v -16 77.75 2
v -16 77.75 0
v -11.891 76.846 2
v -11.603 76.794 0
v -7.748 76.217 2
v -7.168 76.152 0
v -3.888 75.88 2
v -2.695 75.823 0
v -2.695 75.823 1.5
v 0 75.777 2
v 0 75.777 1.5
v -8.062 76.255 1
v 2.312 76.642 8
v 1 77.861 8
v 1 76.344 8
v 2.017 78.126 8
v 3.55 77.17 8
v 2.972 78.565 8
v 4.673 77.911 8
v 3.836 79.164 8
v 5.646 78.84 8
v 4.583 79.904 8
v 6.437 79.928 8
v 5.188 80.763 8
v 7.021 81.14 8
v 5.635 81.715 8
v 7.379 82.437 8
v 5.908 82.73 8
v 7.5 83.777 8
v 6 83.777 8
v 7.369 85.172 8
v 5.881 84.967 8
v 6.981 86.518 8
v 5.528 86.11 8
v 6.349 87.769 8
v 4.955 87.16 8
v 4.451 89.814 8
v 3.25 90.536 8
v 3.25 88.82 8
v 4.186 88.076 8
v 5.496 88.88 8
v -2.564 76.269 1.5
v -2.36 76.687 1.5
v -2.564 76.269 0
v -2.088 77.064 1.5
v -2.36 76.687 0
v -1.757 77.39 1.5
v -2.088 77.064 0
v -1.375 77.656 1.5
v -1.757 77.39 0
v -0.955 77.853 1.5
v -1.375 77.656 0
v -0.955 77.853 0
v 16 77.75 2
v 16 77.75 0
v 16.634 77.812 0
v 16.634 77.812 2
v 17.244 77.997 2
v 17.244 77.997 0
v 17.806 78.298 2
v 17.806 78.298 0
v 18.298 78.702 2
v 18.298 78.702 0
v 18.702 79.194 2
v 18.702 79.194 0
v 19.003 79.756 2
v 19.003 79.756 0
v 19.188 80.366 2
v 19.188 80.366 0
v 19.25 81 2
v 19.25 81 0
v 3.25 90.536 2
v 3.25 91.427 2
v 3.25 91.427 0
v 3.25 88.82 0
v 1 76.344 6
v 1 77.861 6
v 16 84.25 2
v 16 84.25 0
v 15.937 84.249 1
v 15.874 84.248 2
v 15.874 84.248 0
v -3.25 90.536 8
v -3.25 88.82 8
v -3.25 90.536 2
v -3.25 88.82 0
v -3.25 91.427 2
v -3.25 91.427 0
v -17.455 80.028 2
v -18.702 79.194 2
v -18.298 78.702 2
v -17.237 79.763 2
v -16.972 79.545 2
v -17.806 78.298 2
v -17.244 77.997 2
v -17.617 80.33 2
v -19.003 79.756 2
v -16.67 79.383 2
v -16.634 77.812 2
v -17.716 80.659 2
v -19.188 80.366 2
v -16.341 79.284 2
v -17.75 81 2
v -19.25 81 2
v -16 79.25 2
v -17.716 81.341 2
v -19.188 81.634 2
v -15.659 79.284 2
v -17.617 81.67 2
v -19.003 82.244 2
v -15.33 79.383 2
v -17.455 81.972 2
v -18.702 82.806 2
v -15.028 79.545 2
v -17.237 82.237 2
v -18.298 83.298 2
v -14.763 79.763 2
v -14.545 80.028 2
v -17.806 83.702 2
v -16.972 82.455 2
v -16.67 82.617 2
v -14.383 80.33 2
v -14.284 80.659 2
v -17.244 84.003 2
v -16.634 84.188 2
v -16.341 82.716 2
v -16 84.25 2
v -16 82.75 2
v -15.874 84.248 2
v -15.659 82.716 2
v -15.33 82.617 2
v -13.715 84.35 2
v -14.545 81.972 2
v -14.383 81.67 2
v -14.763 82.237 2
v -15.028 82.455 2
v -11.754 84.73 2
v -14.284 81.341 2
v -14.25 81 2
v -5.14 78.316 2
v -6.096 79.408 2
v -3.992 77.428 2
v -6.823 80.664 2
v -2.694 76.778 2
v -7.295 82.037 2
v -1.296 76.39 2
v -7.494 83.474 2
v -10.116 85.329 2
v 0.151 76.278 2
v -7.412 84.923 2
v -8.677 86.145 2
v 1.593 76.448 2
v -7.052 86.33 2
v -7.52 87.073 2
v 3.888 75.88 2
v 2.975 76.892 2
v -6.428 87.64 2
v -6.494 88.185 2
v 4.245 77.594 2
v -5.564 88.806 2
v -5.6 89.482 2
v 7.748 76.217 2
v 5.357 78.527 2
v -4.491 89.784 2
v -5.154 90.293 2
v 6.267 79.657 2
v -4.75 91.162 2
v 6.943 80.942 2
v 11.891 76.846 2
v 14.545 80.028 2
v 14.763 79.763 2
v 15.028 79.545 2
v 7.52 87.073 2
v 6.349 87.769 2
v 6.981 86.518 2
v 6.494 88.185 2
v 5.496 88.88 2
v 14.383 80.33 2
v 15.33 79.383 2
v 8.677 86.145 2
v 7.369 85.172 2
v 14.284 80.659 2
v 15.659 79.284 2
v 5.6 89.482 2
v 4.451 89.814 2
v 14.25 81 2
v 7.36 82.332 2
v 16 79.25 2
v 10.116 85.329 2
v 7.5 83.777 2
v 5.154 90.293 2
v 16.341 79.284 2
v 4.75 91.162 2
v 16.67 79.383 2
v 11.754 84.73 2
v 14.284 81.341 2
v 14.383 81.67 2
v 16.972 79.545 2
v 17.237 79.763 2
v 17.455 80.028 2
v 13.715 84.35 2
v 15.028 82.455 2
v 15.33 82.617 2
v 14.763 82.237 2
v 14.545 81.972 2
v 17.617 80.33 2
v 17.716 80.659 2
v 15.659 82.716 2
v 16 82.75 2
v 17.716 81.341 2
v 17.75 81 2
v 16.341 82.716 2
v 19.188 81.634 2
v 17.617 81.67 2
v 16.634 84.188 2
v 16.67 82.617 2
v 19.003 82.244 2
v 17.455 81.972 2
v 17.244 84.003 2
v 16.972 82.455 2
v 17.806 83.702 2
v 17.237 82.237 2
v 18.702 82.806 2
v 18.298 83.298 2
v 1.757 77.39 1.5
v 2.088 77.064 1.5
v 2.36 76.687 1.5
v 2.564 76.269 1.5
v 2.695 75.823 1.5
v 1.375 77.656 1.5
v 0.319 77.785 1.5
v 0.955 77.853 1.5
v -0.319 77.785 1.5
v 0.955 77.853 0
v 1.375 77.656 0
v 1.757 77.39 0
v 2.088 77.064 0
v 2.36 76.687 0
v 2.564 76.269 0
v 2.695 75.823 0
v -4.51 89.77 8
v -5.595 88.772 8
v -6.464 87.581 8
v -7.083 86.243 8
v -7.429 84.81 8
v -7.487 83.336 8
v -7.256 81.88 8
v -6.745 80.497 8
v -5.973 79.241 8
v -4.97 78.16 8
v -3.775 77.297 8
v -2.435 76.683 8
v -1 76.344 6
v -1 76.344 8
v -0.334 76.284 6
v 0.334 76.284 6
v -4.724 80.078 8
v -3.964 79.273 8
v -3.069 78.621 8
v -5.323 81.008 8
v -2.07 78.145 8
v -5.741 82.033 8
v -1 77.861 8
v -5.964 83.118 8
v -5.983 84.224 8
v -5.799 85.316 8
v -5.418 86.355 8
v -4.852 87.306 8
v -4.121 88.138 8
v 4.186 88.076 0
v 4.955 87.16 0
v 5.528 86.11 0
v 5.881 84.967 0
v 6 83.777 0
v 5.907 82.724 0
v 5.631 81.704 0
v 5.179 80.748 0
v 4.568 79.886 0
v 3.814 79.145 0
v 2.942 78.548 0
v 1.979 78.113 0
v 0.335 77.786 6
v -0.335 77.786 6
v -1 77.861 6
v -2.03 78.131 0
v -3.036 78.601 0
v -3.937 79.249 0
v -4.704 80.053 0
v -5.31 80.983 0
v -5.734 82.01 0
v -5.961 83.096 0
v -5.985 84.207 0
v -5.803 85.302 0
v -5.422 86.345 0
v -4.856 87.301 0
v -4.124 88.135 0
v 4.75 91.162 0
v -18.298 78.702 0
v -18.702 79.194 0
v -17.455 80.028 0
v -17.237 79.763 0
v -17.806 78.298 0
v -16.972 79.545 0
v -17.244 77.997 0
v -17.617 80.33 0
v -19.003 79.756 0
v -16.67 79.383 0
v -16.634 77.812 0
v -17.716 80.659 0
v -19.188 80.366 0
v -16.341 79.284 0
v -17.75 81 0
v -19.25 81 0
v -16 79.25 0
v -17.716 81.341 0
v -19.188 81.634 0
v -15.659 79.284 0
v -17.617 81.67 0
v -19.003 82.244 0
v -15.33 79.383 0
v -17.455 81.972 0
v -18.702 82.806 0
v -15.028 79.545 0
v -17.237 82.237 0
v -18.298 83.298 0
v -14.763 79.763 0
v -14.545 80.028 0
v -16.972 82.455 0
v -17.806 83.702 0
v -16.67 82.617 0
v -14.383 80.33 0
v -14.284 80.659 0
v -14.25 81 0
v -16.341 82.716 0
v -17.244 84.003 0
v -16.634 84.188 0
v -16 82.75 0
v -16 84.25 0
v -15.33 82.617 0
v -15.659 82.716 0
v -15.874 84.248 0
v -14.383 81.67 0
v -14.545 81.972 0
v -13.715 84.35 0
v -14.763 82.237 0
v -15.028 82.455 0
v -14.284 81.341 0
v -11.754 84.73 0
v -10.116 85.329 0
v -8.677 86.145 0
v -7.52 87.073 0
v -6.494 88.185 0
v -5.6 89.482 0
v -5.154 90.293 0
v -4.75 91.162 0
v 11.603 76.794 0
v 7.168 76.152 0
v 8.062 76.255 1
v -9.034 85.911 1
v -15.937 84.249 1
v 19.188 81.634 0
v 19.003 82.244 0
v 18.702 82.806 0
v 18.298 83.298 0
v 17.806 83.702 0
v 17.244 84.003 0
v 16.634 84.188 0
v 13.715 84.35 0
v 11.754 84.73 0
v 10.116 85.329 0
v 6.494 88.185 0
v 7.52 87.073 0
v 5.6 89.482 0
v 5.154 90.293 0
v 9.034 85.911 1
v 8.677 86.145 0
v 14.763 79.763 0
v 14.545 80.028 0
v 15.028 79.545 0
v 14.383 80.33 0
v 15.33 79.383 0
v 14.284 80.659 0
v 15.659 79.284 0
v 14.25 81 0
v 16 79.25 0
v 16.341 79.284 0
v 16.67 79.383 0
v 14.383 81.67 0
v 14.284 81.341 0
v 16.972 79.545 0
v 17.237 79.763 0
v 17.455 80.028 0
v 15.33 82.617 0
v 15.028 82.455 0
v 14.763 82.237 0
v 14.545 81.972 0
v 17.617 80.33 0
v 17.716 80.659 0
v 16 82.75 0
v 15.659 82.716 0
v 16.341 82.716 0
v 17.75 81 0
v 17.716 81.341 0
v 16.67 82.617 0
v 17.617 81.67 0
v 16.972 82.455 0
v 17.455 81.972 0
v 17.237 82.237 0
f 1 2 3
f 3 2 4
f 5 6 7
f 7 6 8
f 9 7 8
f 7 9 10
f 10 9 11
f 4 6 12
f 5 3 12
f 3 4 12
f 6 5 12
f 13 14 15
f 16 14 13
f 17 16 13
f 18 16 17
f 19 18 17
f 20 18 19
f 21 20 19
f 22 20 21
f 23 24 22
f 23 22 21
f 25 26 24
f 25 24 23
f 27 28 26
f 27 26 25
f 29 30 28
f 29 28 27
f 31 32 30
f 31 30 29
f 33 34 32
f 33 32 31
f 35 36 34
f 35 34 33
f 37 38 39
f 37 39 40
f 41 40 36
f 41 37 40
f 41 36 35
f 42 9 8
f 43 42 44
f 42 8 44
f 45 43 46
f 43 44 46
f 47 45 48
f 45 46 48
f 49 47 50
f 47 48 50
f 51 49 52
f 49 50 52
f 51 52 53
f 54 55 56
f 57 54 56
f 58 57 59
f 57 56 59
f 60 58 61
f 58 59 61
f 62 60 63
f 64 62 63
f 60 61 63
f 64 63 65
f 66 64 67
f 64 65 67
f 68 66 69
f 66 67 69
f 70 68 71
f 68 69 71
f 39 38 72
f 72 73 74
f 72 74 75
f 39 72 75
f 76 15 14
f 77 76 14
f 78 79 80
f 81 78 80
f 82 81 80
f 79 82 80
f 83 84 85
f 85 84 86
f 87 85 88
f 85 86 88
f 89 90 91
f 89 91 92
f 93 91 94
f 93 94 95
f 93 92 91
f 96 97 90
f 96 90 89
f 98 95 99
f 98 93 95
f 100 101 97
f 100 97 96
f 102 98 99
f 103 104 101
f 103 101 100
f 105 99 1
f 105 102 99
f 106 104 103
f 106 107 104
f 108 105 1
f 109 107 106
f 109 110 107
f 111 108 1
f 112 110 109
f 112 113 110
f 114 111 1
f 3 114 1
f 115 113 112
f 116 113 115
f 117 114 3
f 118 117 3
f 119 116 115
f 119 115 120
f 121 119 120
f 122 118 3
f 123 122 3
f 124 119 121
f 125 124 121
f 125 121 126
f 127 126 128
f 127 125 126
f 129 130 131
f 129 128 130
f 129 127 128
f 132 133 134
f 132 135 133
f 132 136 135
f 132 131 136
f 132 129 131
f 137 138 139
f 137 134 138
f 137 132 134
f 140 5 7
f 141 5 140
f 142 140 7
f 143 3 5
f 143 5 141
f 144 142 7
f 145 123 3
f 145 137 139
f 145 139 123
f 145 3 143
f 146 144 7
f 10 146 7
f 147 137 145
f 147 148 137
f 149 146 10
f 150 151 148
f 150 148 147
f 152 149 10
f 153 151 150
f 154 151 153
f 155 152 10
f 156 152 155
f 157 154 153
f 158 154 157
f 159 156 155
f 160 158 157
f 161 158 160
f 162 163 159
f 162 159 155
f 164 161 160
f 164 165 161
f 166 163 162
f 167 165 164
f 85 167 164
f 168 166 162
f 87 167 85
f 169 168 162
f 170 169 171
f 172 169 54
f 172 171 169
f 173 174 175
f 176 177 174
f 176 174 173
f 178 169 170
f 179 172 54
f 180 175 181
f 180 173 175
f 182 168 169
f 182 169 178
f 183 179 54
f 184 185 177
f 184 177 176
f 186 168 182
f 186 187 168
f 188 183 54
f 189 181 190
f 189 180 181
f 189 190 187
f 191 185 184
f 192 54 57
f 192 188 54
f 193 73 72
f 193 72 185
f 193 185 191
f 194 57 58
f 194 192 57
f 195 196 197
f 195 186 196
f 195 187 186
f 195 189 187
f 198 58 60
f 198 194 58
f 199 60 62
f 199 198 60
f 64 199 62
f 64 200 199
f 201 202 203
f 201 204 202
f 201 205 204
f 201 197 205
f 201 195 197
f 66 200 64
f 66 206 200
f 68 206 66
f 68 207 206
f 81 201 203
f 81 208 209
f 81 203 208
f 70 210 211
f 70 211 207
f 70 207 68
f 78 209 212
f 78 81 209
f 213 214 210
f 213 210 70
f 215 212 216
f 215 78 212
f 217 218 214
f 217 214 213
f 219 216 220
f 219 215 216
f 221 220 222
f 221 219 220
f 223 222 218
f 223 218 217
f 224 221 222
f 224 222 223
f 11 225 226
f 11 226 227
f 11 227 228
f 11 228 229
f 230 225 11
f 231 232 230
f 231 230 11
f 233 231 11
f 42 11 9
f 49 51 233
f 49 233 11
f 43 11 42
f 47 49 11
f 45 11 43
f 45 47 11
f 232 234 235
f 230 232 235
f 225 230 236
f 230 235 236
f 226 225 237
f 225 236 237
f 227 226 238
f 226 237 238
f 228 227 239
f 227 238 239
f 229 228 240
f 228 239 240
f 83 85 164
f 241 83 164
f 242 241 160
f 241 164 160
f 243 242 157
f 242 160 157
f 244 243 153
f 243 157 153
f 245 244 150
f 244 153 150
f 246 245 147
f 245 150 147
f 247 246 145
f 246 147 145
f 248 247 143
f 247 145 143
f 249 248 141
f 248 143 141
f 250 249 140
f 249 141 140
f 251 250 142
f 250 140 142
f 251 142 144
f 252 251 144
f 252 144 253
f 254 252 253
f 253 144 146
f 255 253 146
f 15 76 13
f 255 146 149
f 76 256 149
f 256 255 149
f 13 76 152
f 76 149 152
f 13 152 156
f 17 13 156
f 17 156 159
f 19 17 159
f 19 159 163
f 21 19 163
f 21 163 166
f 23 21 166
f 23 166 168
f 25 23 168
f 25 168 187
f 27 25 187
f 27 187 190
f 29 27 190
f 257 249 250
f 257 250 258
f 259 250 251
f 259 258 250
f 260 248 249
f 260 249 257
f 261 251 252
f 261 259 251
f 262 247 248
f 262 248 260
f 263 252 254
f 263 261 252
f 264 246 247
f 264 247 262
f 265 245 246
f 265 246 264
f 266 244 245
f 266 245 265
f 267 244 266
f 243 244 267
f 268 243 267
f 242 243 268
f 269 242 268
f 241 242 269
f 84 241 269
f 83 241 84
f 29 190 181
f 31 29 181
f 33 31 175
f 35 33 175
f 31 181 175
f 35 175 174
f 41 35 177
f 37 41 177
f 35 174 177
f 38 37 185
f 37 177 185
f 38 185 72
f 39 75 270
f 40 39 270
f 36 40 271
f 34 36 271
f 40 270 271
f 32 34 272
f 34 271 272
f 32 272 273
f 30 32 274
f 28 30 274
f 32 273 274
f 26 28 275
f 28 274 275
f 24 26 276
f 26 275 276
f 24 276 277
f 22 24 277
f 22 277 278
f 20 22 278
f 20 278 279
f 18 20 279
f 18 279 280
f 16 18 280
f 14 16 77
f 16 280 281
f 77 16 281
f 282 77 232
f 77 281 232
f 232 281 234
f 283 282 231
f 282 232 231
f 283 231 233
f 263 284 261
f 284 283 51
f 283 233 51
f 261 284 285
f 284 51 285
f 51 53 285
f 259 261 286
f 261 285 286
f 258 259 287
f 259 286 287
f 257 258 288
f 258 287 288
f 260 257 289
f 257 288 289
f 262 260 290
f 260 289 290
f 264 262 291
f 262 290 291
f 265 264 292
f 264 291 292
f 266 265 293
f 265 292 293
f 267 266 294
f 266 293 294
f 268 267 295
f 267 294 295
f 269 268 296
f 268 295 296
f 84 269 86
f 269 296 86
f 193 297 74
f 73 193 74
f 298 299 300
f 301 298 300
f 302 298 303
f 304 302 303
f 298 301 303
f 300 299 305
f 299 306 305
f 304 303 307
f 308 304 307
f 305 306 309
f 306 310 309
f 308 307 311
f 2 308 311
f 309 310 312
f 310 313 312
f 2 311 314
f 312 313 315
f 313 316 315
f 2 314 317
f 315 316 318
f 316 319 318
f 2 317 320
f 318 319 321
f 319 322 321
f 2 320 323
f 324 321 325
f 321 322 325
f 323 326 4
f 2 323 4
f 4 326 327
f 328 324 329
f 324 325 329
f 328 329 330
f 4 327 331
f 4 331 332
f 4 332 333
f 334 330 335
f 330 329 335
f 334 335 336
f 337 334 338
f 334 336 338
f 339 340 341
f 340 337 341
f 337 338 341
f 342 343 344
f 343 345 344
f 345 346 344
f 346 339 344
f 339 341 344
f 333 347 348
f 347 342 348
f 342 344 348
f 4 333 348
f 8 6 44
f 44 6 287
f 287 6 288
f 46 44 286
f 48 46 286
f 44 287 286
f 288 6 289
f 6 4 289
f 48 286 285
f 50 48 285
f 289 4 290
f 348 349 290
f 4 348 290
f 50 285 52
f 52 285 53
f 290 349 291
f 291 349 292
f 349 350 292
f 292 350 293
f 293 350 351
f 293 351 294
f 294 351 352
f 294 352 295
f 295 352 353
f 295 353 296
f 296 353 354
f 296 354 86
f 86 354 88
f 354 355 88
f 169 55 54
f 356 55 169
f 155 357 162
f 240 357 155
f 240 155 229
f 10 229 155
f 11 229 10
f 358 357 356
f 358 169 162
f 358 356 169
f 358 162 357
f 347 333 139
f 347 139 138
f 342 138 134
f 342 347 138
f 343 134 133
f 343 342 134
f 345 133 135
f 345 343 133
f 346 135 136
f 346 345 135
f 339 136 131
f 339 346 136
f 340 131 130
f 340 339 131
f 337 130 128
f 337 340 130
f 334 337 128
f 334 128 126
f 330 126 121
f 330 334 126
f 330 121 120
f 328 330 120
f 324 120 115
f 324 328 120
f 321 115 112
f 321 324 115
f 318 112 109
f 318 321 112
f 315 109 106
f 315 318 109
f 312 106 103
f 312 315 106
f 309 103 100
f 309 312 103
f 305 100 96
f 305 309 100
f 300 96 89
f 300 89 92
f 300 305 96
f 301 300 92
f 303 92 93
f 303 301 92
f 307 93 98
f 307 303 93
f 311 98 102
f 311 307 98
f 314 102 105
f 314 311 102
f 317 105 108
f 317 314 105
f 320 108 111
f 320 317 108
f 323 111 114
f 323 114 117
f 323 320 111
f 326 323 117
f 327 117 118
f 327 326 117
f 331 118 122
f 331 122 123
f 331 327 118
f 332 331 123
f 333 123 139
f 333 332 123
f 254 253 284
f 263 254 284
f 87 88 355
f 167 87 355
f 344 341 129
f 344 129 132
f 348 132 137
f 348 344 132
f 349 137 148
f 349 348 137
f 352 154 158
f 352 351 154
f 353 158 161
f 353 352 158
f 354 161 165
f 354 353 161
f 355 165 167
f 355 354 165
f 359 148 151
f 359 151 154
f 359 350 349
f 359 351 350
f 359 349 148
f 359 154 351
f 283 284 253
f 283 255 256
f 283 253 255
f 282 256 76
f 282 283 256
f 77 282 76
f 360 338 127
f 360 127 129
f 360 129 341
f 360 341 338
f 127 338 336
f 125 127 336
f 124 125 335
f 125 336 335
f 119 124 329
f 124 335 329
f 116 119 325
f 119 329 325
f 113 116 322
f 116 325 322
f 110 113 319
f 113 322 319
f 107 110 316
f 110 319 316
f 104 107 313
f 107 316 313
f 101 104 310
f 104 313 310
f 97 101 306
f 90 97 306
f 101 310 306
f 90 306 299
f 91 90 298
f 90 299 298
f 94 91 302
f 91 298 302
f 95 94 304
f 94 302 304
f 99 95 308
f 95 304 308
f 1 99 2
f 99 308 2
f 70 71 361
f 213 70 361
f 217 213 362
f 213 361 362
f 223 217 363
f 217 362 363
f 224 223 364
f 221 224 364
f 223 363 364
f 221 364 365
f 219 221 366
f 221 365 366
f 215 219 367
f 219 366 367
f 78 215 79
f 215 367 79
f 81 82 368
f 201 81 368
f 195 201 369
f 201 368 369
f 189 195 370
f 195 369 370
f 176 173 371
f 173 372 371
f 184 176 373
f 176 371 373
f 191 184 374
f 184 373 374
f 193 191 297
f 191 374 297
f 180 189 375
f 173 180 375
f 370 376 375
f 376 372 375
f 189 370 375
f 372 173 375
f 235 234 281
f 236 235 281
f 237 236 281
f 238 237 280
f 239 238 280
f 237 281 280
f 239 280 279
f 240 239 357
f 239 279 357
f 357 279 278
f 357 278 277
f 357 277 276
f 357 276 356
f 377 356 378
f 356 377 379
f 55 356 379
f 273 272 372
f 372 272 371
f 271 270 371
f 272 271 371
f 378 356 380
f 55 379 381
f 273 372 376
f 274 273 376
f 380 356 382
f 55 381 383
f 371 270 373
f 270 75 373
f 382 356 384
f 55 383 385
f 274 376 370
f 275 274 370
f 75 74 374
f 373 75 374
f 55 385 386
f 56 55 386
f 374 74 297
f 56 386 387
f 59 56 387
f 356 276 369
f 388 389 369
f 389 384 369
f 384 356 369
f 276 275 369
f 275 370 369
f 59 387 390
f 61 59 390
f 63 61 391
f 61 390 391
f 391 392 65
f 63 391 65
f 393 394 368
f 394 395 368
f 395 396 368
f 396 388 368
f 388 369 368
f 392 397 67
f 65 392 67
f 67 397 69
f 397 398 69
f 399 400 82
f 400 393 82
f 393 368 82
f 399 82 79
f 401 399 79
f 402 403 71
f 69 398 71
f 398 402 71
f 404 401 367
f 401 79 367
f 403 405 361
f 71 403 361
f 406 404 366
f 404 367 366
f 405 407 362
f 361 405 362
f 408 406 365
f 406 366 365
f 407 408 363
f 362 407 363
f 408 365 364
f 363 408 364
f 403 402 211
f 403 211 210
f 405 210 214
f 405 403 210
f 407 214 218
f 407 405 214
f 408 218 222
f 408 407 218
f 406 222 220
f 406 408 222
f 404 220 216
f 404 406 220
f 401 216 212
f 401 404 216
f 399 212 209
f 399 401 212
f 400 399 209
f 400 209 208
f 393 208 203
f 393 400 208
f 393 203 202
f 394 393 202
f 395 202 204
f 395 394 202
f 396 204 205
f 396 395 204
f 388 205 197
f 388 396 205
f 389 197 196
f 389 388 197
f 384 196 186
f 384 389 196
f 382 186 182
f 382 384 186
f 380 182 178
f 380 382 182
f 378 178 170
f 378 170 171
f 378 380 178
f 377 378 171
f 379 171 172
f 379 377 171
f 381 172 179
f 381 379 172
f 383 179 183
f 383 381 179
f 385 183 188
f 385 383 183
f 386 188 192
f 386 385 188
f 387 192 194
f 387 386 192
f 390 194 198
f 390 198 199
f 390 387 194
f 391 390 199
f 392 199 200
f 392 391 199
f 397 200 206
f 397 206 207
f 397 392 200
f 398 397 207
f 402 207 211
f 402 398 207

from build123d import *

# Parameters (mm, degrees)
SKETCH1_R           = 1.75
BOSS_EXTRUDE1_DEPTH = 2
BOSS_EXTRUDE2_DEPTH = 6
SKETCH4_W           = 2
SKETCH4_H           = 1.583920217
CUT_EXTRUDE1_DEPTH  = 2
SKETCH5_R           = 2.75
CUT_EXTRUDE3_DEPTH  = 1.5


with BuildPart() as part:
    # Sketch1 → Boss-Extrude1 (new body)
    # profile 1 of 3: a face of its own
    with BuildSketch(Plane.XY):
        with BuildLine():
            ThreePointArc((-12.75, 81), (-13.657806533, 83.25313776), (-15.874079855, 84.247559717))
            add(Edge.make_bspline(
                [(-16, 84.25), (-15.936886934, 84.248565124), (-15.874079855, 84.247559717)],
                knots=[0, 0, 0, 0.007677399, 0.007677399, 0.007677399], degree=2))
            ThreePointArc((-16, 84.25), (-19.25, 81), (-16, 77.75))
            ThreePointArc((-16, 77.75), (-13.701902961, 78.701902961), (-12.75, 81))
        make_face()
        with Locations((-16, 81)):
            Circle(SKETCH1_R, mode=Mode.SUBTRACT)
    # profile 2 of 3: a face of its own
    with BuildSketch(Plane.XY):
        with BuildLine():
            ThreePointArc((6, 83.776937313), (-2.872281323, 78.509110436), (-3.25, 88.820497563))
            Line((-3.25, 88.820497563), (-3.25, 91.426937313))
            Line((-3.25, 91.426937313), (-4.75, 91.162446842))
            add(Edge.make_bspline(
                [(-15.874079855, 84.247559717), (-7.75611093, 84.117608401), (-4.75, 91.162446842)],
                knots=[0.007677399, 0.007677399, 0.007677399, 1, 1, 1], degree=2))
            ThreePointArc((-15.874079855, 84.247559717), (-13.657806533, 83.25313776), (-12.75, 81))
            ThreePointArc((-12.75, 81), (-13.701902961, 78.701902961), (-16, 77.75))
            add(Edge.make_bspline(
                [(-16, 77.75), (-8.124796889, 75.747320021), (0, 75.776937313)],
                knots=[0, 0, 0, 1, 1, 1], degree=2))
            add(Edge.make_bspline(
                [(16, 77.75), (8.124796889, 75.747320021), (0, 75.776937313)],
                knots=[0, 0, 0, 1, 1, 1], degree=2))
            ThreePointArc((16, 77.75), (12.750610128, 80.937028105), (15.874079855, 84.247559717))
            add(Edge.make_bspline(
                [(15.874079855, 84.247559717), (7.75611093, 84.117608401), (4.75, 91.162446842)],
                knots=[0.007677399, 0.007677399, 0.007677399, 1, 1, 1], degree=2))
            Line((4.75, 91.162446842), (3.25, 91.426937313))
            Line((3.25, 91.426937313), (3.25, 88.820497563))
            ThreePointArc((3.25, 88.820497563), (5.267826876, 86.649218636), (6, 83.776937313))
        make_face()
    # profile 3 of 3: a face of its own
    with BuildSketch(Plane.XY):
        with BuildLine():
            add(Edge.make_bspline(
                [(16, 84.25), (15.936886934, 84.248565124), (15.874079855, 84.247559717)],
                knots=[0, 0, 0, 0.007677399, 0.007677399, 0.007677399], degree=2))
            ThreePointArc((15.874079855, 84.247559717), (12.750610128, 80.937028105), (16, 77.75))
            ThreePointArc((16, 77.75), (18.298097039, 78.701902961), (19.25, 81))
            ThreePointArc((19.25, 81), (18.298097039, 83.298097039), (16, 84.25))
        make_face()
        with Locations((16, 81)):
            Circle(SKETCH1_R, mode=Mode.SUBTRACT)
    extrude(amount=BOSS_EXTRUDE1_DEPTH)

    # Sketch2 → Boss-Extrude2 (add)
    with BuildSketch(Plane.XY.offset(2)):
        with BuildLine():
            ThreePointArc((7.5, 83.776937313), (6.34921255, 87.769117168), (3.25, 90.53619023))
            Line((3.25, 90.53619023), (3.25, 88.820497563))
            ThreePointArc((3.25, 88.820497563), (5.267826876, 86.649218636), (6, 83.776937313))
            ThreePointArc((6, 83.776937313), (-2.872281323, 78.509110436), (-3.25, 88.820497563))
            Line((-3.25, 88.820497563), (-3.25, 90.53619023))
            ThreePointArc((-3.25, 90.53619023), (-3.992179856, 77.427724763), (7.5, 83.776937313))
        make_face()
    extrude(amount=BOSS_EXTRUDE2_DEPTH)

    # Sketch4 → Cut-Extrude1 (cut)
    with BuildSketch(Plane.XY.offset(8)):
        with Locations((0, 77.068897421)):
            Rectangle(SKETCH4_W, SKETCH4_H)
    extrude(amount=-CUT_EXTRUDE1_DEPTH, mode=Mode.SUBTRACT)

    # Sketch5 → Cut-Extrude3 (cut)
    with BuildSketch(Plane(origin=(0, 0, 0), x_dir=(-1, 0, 0), z_dir=(0, 0, -1))):
        with Locations((0, 75.274341128)):
            Circle(SKETCH5_R)
    extrude(amount=-CUT_EXTRUDE3_DEPTH, mode=Mode.SUBTRACT)


solid = part.part
